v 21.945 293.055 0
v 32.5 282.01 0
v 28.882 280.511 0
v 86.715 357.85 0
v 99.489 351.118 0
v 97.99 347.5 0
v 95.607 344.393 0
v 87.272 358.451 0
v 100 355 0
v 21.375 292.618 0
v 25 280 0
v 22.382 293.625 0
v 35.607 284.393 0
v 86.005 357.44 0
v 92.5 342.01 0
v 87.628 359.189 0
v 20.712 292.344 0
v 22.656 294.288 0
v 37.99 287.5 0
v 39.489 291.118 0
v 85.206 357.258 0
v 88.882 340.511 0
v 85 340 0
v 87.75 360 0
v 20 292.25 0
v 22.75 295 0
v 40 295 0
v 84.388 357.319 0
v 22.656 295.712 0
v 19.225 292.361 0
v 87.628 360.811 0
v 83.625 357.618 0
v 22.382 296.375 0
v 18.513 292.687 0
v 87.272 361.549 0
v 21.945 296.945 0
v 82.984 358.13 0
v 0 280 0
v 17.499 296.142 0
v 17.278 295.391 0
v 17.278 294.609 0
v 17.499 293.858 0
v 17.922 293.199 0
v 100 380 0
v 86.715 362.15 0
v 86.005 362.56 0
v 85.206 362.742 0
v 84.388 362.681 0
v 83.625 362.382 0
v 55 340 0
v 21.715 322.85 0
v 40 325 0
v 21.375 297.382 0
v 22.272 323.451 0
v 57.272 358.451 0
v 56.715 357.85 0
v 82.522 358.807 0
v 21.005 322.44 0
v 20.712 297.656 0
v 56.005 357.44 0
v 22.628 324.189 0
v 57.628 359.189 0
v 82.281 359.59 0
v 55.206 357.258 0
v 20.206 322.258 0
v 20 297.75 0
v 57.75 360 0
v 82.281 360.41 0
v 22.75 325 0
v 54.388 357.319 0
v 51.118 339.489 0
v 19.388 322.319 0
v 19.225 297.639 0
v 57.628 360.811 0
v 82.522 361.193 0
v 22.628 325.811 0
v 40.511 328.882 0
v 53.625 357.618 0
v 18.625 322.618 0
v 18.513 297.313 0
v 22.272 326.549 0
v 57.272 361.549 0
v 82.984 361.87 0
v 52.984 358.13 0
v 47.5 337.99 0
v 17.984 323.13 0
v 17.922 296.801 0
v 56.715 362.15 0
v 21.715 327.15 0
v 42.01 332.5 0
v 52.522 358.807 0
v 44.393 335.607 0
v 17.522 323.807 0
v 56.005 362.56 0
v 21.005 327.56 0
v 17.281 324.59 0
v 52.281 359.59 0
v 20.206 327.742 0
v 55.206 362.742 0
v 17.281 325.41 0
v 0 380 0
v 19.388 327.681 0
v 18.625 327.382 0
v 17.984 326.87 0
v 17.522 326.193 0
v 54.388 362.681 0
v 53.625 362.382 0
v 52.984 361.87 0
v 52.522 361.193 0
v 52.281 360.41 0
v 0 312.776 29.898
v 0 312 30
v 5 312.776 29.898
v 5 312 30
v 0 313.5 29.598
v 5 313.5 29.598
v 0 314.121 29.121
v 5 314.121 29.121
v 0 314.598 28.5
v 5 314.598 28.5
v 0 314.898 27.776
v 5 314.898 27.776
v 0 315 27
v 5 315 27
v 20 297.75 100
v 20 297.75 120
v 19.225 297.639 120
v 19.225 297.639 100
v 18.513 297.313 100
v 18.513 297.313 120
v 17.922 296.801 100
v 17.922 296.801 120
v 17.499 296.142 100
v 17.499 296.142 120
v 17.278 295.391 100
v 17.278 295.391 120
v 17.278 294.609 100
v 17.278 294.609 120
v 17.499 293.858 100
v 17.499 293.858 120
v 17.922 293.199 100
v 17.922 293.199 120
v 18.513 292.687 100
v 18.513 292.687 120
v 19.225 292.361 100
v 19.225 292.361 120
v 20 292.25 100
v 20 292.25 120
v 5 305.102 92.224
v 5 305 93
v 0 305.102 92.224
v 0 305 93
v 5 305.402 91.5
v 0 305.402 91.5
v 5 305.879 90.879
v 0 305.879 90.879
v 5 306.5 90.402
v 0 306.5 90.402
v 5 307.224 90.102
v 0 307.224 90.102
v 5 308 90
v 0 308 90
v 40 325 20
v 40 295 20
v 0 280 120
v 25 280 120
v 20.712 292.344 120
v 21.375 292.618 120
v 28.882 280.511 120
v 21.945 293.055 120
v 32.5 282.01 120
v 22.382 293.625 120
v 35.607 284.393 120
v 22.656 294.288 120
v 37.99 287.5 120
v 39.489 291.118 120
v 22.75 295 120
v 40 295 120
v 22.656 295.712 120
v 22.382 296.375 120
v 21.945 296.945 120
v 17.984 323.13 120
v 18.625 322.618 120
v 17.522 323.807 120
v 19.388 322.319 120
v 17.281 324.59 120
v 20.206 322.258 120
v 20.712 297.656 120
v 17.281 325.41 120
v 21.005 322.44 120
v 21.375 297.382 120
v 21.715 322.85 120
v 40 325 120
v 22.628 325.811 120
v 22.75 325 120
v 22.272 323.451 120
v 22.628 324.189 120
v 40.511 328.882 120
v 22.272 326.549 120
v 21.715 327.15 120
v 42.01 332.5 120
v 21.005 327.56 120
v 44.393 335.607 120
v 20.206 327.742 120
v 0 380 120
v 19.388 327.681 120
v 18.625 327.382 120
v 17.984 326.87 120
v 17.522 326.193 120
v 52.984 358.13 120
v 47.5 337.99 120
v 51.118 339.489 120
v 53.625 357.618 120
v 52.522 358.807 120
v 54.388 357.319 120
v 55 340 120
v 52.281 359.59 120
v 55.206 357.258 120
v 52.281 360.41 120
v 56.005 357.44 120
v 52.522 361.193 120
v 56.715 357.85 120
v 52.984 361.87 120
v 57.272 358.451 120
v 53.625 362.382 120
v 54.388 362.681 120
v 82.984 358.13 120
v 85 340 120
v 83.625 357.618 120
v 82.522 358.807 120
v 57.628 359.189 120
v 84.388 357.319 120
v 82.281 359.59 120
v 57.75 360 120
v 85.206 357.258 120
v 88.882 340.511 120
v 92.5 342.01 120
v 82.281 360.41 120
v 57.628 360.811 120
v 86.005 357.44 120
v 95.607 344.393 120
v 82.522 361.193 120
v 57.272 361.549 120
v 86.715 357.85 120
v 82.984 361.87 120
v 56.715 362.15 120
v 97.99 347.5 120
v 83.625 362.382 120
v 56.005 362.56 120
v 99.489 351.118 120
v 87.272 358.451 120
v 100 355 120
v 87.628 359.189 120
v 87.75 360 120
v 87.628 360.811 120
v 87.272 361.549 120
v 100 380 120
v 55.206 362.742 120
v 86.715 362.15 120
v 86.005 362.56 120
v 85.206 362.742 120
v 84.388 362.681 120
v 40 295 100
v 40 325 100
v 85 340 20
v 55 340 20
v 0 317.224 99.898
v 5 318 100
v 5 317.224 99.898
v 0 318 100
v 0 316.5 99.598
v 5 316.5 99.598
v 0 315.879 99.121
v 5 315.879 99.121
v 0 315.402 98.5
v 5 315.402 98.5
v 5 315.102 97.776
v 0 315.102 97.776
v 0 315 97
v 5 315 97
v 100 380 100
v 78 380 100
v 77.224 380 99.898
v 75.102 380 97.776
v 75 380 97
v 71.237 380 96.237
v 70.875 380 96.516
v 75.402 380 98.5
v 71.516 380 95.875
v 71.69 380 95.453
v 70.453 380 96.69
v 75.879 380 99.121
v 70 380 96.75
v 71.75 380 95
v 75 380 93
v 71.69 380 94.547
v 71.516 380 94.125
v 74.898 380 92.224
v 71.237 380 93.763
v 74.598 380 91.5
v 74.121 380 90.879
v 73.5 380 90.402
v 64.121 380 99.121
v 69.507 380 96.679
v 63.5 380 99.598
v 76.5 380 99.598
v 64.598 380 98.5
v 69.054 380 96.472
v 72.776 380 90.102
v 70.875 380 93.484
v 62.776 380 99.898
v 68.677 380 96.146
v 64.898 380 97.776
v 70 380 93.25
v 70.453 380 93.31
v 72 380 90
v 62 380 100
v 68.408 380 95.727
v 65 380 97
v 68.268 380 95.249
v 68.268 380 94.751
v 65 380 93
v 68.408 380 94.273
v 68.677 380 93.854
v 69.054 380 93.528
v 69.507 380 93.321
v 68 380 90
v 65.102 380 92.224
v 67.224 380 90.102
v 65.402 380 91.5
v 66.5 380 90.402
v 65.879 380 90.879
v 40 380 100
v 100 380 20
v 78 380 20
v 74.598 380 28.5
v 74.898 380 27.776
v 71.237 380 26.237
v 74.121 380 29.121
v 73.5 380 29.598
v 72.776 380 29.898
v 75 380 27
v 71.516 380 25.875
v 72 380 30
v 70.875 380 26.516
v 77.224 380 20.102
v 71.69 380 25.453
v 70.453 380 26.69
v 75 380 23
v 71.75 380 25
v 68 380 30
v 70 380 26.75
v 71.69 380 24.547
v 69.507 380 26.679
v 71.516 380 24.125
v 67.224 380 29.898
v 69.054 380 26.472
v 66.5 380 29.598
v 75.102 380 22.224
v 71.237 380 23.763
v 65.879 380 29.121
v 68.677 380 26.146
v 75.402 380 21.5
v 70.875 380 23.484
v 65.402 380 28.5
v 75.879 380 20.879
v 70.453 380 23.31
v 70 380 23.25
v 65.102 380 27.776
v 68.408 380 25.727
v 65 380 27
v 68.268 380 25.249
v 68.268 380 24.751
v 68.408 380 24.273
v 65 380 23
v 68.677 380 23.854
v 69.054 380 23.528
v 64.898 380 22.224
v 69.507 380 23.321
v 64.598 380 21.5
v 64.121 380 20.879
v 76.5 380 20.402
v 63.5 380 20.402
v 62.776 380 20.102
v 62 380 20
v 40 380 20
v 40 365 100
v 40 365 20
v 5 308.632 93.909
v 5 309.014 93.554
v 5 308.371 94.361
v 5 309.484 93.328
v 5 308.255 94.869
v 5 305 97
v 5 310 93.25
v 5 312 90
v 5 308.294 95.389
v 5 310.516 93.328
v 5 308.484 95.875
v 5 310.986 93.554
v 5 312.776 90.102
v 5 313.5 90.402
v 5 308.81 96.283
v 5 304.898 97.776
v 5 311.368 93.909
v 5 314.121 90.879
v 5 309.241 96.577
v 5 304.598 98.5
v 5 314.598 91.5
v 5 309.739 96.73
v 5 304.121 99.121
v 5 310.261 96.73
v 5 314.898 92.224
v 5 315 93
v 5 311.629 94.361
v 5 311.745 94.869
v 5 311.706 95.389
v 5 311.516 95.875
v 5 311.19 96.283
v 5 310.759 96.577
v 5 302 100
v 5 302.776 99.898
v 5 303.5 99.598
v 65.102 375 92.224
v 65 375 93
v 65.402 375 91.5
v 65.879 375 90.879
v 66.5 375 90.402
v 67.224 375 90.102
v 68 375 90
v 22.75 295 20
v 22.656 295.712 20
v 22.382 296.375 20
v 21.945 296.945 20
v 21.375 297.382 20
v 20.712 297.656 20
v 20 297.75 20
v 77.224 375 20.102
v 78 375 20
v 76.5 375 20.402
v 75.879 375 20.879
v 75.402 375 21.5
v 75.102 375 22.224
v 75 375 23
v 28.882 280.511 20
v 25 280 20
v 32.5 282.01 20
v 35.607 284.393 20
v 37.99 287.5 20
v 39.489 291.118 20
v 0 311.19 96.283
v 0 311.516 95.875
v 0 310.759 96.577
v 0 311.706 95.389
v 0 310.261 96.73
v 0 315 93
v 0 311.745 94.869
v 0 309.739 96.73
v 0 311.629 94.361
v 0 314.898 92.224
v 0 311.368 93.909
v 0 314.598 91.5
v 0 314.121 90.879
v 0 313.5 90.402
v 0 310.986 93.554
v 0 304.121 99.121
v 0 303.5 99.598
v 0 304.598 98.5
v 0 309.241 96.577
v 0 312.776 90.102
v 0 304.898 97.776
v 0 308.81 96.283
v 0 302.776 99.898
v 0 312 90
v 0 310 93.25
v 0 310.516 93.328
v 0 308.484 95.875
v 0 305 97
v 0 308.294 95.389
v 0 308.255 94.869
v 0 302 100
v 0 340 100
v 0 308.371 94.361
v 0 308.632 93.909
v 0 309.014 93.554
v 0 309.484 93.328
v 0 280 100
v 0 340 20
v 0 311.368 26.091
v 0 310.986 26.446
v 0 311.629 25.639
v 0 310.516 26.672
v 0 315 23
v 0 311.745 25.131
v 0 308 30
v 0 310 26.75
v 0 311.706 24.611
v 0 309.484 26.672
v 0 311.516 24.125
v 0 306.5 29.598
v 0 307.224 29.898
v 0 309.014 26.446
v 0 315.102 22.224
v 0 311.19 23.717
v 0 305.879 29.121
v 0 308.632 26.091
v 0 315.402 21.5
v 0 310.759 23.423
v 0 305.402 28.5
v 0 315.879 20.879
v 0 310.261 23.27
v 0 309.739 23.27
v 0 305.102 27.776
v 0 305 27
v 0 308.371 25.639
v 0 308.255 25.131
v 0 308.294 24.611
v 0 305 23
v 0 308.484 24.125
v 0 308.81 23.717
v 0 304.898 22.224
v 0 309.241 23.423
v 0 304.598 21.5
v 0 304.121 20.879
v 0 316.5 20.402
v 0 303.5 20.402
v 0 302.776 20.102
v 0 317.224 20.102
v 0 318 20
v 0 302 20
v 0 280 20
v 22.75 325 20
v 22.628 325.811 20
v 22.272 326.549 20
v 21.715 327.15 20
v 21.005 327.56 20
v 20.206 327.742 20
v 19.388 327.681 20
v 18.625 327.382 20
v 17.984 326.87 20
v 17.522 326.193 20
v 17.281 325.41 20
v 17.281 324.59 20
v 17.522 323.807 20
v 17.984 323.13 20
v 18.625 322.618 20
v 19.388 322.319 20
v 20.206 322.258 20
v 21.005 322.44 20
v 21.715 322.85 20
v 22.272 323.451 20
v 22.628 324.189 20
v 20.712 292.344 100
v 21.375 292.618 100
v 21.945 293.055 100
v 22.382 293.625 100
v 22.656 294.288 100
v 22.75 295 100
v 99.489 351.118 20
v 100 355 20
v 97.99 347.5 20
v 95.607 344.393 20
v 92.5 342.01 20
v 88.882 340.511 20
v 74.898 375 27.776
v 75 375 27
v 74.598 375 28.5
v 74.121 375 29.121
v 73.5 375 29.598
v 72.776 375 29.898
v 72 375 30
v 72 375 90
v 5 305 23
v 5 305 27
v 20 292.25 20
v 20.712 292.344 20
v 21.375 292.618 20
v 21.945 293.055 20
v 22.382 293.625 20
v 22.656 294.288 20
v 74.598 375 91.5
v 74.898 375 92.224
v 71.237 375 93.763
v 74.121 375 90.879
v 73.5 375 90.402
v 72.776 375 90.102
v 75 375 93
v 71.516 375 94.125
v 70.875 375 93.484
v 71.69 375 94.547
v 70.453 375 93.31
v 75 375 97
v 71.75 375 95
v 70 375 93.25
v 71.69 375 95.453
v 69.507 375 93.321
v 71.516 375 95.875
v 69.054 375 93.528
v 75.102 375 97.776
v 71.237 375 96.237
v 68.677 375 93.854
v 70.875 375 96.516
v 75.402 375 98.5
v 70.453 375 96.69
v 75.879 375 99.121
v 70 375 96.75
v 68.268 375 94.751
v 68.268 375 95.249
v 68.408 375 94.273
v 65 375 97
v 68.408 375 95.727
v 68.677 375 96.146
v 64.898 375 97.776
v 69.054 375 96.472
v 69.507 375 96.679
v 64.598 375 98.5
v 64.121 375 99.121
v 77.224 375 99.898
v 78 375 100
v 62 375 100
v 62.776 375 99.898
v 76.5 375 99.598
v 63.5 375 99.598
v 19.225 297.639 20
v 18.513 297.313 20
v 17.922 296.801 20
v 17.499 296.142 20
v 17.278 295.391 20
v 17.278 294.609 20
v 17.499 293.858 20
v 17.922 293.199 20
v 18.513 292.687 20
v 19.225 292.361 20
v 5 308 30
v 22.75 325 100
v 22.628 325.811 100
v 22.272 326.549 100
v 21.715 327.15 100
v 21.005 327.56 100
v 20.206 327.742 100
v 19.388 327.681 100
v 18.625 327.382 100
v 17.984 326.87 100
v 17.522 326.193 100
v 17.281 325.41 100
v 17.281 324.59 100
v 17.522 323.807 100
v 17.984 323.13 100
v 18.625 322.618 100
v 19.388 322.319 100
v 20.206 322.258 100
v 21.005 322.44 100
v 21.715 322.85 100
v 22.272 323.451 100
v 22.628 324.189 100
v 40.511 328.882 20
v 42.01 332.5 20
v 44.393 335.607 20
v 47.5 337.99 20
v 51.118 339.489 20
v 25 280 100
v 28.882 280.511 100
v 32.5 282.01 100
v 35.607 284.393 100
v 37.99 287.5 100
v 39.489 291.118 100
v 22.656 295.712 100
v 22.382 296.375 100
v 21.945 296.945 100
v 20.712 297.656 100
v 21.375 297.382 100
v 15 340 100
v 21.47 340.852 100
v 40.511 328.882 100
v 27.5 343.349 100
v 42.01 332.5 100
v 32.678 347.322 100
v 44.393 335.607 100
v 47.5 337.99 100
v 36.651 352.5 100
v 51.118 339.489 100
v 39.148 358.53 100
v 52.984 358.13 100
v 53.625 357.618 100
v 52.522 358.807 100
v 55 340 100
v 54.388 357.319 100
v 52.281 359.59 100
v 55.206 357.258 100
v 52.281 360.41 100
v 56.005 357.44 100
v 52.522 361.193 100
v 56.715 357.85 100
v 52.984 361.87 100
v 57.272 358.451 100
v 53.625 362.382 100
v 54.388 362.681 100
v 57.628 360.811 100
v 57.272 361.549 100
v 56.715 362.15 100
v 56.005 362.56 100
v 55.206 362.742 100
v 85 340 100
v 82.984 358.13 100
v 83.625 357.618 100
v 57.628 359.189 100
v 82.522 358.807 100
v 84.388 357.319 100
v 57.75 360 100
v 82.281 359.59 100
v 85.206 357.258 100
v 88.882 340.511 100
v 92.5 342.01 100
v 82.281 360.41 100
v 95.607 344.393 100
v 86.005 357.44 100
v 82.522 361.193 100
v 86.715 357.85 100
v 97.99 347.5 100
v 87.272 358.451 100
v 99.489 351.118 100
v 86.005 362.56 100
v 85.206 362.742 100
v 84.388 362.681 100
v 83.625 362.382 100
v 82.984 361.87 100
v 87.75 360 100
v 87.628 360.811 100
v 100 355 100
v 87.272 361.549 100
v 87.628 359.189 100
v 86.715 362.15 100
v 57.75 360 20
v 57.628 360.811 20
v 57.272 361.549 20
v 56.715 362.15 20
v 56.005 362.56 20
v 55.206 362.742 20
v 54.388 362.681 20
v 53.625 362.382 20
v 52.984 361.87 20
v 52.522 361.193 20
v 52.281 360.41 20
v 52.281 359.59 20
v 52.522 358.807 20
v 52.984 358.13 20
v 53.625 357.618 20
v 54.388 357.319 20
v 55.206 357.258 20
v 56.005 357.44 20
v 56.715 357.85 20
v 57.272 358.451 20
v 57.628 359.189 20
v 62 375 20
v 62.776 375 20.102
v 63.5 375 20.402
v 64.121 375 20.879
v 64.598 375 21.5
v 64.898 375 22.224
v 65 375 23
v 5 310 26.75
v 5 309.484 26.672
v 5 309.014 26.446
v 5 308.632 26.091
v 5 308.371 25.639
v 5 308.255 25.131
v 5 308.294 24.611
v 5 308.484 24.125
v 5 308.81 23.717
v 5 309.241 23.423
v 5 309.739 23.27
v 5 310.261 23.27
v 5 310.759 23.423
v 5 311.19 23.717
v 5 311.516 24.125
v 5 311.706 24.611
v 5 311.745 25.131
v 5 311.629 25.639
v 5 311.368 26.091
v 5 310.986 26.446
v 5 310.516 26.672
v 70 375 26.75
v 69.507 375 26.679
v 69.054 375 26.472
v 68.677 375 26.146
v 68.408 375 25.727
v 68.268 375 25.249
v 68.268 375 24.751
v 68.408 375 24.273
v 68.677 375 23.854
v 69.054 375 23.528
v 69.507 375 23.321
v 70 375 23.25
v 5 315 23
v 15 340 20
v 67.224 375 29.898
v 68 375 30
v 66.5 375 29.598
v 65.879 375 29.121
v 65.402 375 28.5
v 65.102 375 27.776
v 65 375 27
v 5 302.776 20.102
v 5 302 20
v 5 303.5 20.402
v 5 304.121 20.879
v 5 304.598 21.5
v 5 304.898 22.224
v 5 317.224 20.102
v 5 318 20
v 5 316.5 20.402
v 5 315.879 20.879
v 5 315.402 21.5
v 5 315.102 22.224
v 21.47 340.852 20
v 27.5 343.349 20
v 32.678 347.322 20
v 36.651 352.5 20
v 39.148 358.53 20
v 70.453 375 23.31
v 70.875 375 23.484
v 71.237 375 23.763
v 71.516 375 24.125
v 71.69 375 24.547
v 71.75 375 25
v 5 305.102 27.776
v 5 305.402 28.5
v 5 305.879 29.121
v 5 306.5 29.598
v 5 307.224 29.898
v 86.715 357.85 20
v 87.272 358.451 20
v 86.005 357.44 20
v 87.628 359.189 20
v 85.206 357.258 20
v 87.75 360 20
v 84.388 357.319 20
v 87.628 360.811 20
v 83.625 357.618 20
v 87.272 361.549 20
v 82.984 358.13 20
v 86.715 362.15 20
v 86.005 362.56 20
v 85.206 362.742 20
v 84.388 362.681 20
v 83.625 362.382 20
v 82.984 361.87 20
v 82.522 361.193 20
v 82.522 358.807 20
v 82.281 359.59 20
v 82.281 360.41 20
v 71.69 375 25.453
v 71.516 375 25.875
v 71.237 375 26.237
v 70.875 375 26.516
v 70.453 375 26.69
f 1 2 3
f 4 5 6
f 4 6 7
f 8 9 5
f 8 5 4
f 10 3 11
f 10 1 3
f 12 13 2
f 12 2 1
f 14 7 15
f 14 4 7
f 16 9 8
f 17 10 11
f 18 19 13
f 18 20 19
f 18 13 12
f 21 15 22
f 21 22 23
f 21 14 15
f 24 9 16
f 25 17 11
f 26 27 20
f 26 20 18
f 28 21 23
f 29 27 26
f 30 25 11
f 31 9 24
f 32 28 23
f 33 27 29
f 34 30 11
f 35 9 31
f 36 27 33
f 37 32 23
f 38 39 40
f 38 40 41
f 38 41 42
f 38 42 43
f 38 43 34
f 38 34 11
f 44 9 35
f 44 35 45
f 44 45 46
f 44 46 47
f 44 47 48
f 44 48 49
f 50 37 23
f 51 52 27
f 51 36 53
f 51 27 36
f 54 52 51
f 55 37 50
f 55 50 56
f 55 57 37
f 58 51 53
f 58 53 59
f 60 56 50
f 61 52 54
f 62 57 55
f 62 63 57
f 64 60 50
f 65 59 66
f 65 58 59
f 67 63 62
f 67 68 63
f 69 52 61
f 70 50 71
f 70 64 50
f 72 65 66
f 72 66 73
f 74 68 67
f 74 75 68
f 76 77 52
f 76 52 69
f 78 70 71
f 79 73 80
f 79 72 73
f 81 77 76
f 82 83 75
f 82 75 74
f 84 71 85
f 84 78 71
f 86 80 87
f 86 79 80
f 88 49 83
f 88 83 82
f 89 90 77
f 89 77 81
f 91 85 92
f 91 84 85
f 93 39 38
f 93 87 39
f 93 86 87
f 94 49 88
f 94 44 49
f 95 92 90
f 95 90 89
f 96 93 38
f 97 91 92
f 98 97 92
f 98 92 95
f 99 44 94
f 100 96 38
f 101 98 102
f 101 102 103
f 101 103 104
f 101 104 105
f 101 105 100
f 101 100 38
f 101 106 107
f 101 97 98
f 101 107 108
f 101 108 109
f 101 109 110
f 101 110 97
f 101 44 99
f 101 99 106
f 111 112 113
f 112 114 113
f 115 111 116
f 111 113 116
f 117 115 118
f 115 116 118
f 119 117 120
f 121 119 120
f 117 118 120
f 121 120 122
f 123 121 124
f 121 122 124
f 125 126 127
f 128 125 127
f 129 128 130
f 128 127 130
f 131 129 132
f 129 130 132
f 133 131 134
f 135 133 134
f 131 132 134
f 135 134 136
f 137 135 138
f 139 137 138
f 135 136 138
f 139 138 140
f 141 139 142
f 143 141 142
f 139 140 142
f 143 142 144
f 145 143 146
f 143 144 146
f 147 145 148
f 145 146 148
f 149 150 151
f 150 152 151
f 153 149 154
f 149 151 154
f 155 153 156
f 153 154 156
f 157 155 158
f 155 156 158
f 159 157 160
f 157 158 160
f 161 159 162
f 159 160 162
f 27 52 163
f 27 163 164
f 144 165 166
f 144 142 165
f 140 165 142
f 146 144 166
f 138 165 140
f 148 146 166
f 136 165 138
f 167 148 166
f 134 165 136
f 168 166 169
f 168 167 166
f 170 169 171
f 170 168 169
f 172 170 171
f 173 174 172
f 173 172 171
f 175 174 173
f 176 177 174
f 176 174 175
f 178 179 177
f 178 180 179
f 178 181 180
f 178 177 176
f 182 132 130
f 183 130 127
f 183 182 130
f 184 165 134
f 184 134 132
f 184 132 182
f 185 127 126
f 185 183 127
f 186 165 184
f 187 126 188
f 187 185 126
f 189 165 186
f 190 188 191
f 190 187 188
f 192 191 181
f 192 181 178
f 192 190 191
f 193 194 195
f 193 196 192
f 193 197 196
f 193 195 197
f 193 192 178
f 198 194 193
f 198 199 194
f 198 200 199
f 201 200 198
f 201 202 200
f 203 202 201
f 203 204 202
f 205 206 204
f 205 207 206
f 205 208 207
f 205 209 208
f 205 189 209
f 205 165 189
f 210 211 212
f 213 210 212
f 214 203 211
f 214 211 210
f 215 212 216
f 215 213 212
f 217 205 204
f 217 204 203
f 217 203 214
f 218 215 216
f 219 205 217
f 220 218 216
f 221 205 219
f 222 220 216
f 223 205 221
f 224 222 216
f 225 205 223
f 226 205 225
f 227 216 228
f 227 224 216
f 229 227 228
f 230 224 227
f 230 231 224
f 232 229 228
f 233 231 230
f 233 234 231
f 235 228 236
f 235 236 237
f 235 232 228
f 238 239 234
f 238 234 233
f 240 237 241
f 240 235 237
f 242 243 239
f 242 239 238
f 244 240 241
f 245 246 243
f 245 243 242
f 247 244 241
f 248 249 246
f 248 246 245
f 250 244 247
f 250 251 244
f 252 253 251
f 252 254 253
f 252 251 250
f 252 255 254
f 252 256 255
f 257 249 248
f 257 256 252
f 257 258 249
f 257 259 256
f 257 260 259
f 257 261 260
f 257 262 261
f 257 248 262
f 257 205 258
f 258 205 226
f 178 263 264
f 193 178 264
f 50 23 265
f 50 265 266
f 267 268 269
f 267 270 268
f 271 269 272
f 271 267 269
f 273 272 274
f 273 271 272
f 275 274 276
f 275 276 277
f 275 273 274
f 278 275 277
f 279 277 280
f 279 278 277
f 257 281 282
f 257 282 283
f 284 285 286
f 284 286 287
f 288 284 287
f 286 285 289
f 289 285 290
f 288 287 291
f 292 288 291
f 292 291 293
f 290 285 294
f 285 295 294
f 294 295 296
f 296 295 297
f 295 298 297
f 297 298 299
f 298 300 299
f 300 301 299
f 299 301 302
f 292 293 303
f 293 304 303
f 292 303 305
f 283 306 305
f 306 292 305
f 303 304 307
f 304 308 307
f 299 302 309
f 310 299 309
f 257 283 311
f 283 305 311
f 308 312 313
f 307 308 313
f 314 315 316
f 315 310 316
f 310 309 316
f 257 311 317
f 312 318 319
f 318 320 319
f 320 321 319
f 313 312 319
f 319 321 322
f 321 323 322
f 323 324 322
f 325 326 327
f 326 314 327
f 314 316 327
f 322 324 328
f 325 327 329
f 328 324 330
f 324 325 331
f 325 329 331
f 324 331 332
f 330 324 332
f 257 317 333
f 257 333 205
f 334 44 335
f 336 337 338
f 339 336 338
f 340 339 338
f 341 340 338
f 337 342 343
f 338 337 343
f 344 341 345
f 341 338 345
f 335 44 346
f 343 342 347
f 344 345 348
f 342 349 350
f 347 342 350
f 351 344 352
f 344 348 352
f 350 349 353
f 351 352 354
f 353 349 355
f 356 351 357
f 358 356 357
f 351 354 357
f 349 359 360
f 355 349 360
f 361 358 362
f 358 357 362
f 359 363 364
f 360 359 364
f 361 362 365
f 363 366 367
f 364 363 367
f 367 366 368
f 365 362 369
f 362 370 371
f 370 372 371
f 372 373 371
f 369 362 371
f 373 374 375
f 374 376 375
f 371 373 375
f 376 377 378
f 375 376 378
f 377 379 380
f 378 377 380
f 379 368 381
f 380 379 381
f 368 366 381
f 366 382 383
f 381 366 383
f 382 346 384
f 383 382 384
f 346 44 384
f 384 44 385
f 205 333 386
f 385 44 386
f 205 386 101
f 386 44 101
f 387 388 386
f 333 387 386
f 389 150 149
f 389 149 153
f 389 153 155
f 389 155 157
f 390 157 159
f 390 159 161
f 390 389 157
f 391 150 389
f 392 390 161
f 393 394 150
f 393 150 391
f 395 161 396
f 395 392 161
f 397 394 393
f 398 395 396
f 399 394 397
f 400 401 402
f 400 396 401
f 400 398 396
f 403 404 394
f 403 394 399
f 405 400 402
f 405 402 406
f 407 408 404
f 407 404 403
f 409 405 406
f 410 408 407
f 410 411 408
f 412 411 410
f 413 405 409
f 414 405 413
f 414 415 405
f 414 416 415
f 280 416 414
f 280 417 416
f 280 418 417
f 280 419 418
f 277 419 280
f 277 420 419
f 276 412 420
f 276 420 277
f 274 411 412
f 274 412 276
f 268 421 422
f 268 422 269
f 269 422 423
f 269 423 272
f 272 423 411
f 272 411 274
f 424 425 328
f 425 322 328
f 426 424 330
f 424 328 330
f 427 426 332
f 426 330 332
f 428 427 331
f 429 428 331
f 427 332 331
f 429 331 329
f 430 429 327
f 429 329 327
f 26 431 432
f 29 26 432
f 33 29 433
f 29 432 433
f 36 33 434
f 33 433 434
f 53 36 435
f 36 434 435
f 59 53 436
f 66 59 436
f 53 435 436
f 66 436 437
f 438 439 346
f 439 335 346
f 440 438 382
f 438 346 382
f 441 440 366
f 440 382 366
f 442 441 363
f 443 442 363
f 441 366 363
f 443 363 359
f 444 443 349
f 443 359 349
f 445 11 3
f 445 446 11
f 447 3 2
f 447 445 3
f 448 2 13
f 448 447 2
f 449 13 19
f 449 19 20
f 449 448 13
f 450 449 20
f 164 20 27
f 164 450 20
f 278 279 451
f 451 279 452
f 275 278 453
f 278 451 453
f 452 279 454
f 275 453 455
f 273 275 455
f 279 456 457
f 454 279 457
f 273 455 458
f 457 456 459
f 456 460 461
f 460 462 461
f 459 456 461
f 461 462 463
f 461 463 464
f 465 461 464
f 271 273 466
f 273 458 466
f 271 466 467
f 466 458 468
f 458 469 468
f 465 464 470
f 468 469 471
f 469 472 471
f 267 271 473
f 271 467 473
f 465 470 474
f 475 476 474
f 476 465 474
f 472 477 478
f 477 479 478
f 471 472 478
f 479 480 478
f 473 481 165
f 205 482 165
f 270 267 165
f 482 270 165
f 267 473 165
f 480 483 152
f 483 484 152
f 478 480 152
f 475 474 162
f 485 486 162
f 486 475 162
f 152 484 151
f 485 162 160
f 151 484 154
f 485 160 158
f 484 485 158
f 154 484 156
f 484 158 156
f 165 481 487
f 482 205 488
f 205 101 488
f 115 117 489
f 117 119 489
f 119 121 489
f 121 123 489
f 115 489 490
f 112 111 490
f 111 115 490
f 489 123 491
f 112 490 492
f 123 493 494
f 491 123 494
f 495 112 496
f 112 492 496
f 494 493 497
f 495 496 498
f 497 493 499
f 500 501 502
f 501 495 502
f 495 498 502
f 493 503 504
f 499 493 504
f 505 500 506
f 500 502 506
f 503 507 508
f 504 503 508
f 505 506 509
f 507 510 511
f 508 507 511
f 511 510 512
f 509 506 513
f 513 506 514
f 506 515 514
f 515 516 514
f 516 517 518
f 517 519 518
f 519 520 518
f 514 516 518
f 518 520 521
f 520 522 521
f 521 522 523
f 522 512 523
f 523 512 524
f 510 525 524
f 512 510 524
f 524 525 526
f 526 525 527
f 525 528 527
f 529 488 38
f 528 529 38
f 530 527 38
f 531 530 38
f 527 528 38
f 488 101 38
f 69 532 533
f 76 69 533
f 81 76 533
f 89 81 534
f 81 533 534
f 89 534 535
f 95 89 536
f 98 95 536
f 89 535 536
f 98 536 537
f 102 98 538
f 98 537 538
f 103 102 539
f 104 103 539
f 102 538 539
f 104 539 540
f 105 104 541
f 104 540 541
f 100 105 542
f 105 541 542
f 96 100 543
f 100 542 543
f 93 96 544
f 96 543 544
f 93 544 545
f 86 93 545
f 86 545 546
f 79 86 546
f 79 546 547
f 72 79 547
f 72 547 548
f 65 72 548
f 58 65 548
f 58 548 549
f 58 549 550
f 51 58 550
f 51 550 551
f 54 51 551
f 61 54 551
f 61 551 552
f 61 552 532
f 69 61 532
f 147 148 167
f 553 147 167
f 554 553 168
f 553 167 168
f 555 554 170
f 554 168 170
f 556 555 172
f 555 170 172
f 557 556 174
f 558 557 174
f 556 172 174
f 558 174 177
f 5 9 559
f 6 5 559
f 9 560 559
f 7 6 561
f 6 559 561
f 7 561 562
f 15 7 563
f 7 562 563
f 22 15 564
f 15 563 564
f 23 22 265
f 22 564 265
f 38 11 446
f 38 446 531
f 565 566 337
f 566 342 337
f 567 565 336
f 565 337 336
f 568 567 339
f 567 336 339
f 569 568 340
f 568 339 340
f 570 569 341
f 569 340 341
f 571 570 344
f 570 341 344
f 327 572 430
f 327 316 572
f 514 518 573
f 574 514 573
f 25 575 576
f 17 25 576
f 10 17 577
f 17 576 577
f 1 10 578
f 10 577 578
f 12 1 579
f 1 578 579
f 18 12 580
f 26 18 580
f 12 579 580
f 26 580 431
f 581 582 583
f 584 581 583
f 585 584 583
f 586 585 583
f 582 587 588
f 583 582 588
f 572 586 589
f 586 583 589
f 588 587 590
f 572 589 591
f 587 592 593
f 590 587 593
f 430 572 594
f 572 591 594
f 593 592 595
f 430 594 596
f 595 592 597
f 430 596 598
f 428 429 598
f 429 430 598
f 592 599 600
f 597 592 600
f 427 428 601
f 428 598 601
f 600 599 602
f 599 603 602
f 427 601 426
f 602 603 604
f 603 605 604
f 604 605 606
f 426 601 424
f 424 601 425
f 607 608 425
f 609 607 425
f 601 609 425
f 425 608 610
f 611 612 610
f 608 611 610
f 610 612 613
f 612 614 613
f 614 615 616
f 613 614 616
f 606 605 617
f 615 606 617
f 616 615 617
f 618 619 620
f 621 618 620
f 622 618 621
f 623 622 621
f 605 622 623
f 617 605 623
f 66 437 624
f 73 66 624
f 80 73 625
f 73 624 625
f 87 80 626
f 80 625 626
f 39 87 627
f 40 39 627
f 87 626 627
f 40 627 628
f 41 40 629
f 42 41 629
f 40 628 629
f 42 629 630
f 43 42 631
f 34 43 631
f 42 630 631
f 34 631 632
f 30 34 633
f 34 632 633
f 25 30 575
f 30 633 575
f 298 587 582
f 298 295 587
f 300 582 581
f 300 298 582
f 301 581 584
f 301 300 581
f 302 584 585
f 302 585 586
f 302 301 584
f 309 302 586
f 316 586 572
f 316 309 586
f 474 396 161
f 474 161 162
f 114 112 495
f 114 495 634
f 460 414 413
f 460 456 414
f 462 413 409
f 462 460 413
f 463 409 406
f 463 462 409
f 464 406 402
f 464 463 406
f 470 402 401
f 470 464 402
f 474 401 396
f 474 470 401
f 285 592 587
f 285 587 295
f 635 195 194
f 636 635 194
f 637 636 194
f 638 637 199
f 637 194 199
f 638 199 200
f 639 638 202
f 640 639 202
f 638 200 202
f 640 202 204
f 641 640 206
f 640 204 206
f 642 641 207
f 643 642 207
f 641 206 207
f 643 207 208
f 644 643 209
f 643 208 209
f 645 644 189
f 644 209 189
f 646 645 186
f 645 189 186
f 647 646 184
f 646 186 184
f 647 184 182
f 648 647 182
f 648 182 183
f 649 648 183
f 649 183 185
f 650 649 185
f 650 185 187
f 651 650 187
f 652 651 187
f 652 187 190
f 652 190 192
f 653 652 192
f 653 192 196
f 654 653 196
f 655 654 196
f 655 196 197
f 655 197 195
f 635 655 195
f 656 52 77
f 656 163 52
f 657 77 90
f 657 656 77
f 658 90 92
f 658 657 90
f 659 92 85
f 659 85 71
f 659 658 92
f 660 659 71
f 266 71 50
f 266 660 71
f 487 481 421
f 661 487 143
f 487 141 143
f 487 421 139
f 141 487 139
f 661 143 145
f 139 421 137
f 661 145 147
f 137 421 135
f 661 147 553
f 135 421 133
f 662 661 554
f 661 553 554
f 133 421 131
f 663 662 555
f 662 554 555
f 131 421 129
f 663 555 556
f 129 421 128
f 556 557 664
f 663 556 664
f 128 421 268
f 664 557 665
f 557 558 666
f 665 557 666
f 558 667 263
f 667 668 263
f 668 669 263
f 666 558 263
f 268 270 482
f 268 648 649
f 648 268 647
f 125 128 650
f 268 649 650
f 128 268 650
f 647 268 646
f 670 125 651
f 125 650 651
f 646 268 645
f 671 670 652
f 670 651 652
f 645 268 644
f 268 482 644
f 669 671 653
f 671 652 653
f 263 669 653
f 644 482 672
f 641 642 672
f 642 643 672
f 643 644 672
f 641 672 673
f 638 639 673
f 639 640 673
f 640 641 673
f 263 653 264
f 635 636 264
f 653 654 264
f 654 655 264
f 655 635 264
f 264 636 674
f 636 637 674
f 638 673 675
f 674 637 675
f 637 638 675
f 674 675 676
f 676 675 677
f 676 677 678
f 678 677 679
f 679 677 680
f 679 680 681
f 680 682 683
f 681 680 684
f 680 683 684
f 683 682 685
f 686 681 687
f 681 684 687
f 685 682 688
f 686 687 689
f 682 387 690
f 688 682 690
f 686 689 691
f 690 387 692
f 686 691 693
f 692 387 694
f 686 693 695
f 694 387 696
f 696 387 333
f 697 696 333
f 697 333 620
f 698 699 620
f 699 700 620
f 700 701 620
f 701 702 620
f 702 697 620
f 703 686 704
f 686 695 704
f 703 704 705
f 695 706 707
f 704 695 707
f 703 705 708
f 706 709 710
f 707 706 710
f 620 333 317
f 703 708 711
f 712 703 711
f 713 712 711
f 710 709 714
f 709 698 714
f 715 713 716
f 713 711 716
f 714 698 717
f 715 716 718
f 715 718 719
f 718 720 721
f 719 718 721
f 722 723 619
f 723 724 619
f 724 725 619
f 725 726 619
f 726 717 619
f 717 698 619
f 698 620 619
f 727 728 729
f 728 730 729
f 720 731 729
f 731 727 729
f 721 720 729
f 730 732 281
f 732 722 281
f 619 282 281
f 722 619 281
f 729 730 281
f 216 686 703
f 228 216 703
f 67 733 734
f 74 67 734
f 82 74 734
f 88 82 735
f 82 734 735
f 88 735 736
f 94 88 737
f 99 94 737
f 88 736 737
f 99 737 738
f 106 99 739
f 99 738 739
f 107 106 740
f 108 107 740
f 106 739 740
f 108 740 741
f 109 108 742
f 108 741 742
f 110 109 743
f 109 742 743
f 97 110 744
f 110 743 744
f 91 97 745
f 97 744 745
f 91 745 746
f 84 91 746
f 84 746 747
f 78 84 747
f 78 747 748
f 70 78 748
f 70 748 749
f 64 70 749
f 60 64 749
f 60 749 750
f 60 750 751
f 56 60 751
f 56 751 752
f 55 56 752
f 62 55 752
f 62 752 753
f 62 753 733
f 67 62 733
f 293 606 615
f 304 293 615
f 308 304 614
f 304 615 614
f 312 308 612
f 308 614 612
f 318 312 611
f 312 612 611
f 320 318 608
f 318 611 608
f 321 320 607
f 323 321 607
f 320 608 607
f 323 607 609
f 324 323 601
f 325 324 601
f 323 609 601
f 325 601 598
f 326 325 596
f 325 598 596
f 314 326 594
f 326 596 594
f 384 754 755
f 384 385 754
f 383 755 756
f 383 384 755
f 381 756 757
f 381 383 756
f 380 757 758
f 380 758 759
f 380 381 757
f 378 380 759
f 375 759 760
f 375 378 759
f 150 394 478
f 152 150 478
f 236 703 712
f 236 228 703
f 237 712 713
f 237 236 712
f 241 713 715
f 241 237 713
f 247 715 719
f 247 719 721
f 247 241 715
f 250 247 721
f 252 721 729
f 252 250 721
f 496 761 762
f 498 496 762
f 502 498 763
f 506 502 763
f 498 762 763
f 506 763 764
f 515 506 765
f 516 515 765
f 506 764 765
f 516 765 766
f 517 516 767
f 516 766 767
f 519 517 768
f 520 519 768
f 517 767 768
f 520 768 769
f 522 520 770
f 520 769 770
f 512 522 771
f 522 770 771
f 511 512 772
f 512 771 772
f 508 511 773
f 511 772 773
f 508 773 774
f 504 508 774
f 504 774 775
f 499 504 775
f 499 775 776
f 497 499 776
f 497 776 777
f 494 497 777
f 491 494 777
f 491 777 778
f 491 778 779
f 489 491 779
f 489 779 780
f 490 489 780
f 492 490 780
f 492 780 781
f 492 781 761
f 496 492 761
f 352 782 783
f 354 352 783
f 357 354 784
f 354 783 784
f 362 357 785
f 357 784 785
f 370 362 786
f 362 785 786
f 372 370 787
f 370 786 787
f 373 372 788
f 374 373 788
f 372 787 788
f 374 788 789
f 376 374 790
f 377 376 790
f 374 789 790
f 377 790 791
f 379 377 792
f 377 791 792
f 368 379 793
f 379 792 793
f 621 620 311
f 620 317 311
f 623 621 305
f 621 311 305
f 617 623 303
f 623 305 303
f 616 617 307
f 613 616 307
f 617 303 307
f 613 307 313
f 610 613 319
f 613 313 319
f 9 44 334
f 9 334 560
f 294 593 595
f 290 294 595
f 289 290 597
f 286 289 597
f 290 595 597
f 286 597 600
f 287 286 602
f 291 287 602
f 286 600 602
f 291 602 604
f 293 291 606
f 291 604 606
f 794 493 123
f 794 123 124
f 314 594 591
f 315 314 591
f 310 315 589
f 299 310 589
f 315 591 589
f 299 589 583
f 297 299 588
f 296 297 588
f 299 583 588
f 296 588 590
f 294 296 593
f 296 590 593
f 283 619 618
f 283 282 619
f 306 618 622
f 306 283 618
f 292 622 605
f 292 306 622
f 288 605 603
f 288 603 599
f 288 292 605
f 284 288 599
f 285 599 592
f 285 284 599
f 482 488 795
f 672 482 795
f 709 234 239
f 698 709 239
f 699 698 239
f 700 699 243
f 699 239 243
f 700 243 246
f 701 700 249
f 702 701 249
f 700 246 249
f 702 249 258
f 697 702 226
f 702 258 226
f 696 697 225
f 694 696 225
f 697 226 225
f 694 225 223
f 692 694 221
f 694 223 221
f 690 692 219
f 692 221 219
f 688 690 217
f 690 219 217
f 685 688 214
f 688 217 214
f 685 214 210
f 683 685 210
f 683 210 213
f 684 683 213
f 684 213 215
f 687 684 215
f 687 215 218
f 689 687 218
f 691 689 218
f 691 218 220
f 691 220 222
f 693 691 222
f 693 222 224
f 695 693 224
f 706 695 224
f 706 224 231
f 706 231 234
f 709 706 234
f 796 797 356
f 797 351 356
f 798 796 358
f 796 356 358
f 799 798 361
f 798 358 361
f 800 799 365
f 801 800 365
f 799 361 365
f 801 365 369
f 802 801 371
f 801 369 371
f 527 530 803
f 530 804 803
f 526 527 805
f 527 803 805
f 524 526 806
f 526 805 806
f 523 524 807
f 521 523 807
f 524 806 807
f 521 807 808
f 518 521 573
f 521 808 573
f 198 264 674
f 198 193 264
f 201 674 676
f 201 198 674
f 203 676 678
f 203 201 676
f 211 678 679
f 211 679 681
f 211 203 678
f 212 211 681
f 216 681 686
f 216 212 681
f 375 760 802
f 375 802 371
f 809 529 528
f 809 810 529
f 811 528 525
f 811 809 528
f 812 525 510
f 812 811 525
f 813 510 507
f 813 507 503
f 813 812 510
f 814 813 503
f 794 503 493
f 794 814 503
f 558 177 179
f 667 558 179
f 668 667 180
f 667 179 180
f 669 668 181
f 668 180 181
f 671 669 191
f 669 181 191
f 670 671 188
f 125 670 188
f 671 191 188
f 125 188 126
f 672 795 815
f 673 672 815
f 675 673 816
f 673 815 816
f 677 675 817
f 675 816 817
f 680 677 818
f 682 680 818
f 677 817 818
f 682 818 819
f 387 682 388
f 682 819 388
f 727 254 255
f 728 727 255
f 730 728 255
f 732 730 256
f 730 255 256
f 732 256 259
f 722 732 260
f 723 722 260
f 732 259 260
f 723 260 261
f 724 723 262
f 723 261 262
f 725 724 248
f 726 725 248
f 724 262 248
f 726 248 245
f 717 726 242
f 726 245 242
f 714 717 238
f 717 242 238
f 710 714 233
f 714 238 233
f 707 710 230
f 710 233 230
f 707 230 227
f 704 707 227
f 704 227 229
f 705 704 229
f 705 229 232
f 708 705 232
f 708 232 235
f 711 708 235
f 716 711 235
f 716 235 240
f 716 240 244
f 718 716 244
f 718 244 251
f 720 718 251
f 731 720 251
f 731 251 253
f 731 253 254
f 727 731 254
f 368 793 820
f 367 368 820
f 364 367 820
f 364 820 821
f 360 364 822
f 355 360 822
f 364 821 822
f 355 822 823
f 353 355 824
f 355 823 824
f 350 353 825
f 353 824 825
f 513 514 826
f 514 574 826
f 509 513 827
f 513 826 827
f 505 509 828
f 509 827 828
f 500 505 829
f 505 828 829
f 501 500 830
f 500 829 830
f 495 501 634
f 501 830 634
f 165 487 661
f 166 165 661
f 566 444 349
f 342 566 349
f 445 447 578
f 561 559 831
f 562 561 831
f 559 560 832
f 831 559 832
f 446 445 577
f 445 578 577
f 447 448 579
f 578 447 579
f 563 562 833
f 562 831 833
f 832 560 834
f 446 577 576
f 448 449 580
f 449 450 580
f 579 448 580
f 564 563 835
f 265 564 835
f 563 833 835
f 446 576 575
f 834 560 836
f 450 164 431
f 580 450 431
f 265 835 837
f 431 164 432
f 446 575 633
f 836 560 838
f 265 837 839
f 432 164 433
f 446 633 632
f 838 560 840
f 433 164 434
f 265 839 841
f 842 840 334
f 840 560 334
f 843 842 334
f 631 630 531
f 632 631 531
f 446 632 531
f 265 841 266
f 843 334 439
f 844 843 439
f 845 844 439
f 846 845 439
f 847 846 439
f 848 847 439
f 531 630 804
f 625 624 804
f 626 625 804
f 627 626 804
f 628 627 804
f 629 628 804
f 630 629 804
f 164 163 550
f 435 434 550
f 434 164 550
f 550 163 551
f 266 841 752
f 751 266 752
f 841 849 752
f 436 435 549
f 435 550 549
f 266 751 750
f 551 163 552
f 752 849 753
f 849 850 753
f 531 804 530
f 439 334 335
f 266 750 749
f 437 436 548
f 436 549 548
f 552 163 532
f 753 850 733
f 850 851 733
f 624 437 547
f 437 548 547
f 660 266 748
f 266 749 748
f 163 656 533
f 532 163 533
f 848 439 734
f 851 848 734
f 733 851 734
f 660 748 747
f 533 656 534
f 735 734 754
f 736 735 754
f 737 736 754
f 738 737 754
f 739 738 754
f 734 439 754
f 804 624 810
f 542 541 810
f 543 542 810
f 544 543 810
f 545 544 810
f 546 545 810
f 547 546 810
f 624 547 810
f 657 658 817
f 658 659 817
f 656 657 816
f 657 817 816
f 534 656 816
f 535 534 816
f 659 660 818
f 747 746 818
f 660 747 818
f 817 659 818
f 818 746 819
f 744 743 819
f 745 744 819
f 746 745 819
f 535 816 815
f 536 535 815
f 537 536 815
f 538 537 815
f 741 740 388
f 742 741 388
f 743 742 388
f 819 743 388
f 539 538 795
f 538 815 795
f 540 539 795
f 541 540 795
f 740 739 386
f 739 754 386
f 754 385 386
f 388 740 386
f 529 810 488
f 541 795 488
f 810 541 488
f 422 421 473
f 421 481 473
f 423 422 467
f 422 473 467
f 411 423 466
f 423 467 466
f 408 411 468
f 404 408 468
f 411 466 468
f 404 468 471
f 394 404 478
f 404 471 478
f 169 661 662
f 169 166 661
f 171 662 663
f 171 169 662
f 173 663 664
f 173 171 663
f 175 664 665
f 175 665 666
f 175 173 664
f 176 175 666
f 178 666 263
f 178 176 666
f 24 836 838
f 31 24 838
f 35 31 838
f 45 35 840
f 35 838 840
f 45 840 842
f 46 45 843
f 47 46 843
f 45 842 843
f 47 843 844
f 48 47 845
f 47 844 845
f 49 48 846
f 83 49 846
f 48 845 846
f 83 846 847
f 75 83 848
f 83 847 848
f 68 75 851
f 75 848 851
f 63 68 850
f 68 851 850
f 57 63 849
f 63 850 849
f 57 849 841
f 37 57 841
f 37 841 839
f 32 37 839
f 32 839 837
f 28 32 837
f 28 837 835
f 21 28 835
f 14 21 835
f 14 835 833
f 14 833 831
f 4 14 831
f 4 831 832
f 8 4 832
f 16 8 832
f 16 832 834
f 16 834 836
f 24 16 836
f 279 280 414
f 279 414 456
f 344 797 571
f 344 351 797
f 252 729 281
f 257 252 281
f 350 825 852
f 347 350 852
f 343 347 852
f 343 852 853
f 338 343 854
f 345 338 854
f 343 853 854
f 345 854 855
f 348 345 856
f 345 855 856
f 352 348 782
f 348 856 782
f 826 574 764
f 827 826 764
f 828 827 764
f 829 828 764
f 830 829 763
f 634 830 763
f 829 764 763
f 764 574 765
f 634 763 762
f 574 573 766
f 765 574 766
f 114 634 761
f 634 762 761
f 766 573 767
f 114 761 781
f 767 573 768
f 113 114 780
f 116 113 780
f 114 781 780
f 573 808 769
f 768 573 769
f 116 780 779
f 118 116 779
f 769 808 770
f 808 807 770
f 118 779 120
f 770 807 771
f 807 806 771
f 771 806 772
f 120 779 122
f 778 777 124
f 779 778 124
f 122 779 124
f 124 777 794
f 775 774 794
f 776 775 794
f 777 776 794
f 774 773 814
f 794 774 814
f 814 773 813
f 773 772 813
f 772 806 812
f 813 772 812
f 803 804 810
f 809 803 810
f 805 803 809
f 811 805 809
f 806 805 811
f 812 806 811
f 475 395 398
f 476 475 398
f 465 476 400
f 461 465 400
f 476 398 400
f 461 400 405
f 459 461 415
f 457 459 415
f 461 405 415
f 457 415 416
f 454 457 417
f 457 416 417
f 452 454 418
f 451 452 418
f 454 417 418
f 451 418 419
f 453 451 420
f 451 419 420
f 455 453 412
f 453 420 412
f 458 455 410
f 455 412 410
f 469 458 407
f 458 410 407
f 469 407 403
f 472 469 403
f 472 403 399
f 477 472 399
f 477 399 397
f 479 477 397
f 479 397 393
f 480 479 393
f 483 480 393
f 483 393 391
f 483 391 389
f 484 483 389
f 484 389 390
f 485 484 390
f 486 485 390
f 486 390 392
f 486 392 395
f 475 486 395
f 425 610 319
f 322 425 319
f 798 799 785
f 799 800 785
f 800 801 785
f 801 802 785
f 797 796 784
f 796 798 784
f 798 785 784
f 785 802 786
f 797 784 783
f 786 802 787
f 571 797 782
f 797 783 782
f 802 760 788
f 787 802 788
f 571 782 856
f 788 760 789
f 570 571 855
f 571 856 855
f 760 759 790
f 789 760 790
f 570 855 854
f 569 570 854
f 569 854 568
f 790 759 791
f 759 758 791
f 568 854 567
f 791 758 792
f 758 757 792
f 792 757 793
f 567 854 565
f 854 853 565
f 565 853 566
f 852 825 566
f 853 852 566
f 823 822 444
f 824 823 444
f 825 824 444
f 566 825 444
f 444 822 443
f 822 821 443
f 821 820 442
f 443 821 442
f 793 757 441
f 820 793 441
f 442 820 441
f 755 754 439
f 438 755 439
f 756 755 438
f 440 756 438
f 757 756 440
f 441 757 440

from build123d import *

# Parameters (mm, degrees)
BOSS_EXTRUDE1_DEPTH = 20
SKETCH2_W           = 40
SKETCH2_H           = 40
BOSS_EXTRUDE2_DEPTH = 80
SKETCH3_W           = 40
SKETCH3_H           = 60
SKETCH3_H_2         = 40
SKETCH3_W_2         = 60
BOSS_EXTRUDE3_DEPTH = 20
SKETCH5_R           = 2.75
CUT_EXTRUDE1_DEPTH  = 167
FILLET1_R           = 25
FILLET2_R           = 15
SKETCH6_W           = 5
SKETCH6_H           = 10
SKETCH6_W_2         = 10
SKETCH6_H_2         = 5
BOSS_EXTRUDE4_DEPTH = 10
CUT_EXTRUDE2_DEPTH  = 10
CUT_EXTRUDE3_DEPTH  = 10
SKETCH9_W           = 10
SKETCH9_H           = 5
SKETCH9_W_2         = 5
SKETCH9_H_2         = 10
BOSS_EXTRUDE5_DEPTH = 10
CUT_EXTRUDE4_DEPTH  = 10
CUT_EXTRUDE5_DEPTH  = 10
FILLET4_R           = 3


with BuildPart() as part:
    # Sketch1 → Boss-Extrude1 (new body)
    with BuildSketch(Plane.XY):
        Polygon((100, 380), (100, 340), (40, 340), (40, 280), (0, 280), (0, 380), align=None)
    extrude(amount=BOSS_EXTRUDE1_DEPTH)

    # Sketch2 → Boss-Extrude2 (add)
    with BuildSketch(Plane.XY.offset(20)):
        with Locations((20, 360)):
            Rectangle(SKETCH2_W, SKETCH2_H)
    extrude(amount=BOSS_EXTRUDE2_DEPTH)

    # Sketch3 → Boss-Extrude3 (add)
    with BuildSketch(Plane.XY.offset(100)):
        with Locations((20, 310)):
            Rectangle(SKETCH3_W, SKETCH3_H)
        with Locations((20, 360)):
            Rectangle(SKETCH3_W, SKETCH3_H_2)
        with Locations((70, 360)):
            Rectangle(SKETCH3_W_2, SKETCH3_H_2)
    extrude(amount=BOSS_EXTRUDE3_DEPTH)

    # Sketch5 → Cut-Extrude1 (cut)
    with BuildSketch(Plane.XY.offset(120)):
        with Locations((55, 360)):
            Circle(SKETCH5_R)
        with BuildLine():
            ThreePointArc((82.25, 360), (85, 357.25), (87.75, 360))
            Line((87.75, 360), (82.25, 360))
        make_face()
        with BuildLine():
            Line((82.25, 360), (87.75, 360))
            ThreePointArc((87.75, 360), (85, 362.75), (82.25, 360))
        make_face()
        with Locations((20, 325)):
            Circle(SKETCH5_R)
        with BuildLine():
            ThreePointArc((22.75, 295), (21.944543648, 296.944543648), (20, 297.75))
            Line((20, 297.75), (20, 292.25))
            ThreePointArc((20, 292.25), (21.944543648, 293.055456352), (22.75, 295))
        make_face()
        with BuildLine():
            Line((20, 292.25), (20, 297.75))
            ThreePointArc((20, 297.75), (17.25, 295), (20, 292.25))
        make_face()
    extrude(amount=-CUT_EXTRUDE1_DEPTH, mode=Mode.SUBTRACT)

    # Fillet1
    # the kernel refuses this fillet: 25 mm, written as the material it takes off along each edge
    with BuildSketch(Plane(origin=(40, 340, 20), x_dir=(0, 1, 0), z_dir=(0, 0, 1))) as fillet1_piece_1:
        with BuildLine():
            CenterArc((FILLET1_R, FILLET1_R), FILLET1_R, 180, 90)
            Line((0, FILLET1_R), (0, 0))
            Line((0, 0), (FILLET1_R, 0))
        make_face()
    extrude(amount=80, mode=Mode.SUBTRACT)

    # Fillet2
    fillet2_edges = [part.edges().sort_by_distance(p)[0] for p in [
        (100, 340, 10),
        (40, 340, 10),
        (40, 280, 10),
        (40, 280, 110),
        (40, 340, 110),
        (100, 340, 110),
    ]]
    fillet(fillet2_edges, radius=FILLET2_R)

    # Sketch6 → Boss-Extrude4 (add)
    with BuildSketch(Plane.XY.offset(20)):
        with Locations((2.5, 310)):
            Rectangle(SKETCH6_W, SKETCH6_H)
        with Locations((70, 377.5)):
            Rectangle(SKETCH6_W_2, SKETCH6_H_2)
    extrude(amount=BOSS_EXTRUDE4_DEPTH)

    # Sketch7 → Cut-Extrude2 (cut)
    with BuildSketch(Plane.XZ.offset(-375)):
        with BuildLine():
            ThreePointArc((71.75, 25), (71.237436867, 26.237436867), (70, 26.75))
            Line((70, 26.75), (70, 23.25))
            ThreePointArc((70, 23.25), (71.237436867, 23.762563133), (71.75, 25))
        make_face()
        with BuildLine():
            Line((70, 23.25), (70, 26.75))
            ThreePointArc((70, 26.75), (68.25, 25), (70, 23.25))
        make_face()
    extrude(amount=-CUT_EXTRUDE2_DEPTH, mode=Mode.SUBTRACT)

    # Sketch8 → Cut-Extrude3 (cut)
    with BuildSketch(Plane(origin=(5, 0, 0), x_dir=(0, 0, -1), z_dir=(1, 0, 0))):
        with BuildLine():
            ThreePointArc((-23.25, 310), (-25, 311.75), (-26.75, 310))
            Line((-26.75, 310), (-23.25, 310))
        make_face()
        with BuildLine():
            Line((-23.25, 310), (-26.75, 310))
            ThreePointArc((-26.75, 310), (-25, 308.25), (-23.25, 310))
        make_face()
    extrude(amount=-CUT_EXTRUDE3_DEPTH, mode=Mode.SUBTRACT)

    # Sketch9 → Boss-Extrude5 (add)
    with BuildSketch(Plane(origin=(0, 0, 100), x_dir=(-1, 0, 0), z_dir=(0, 0, -1))):
        with Locations((-70, 377.5)):
            Rectangle(SKETCH9_W, SKETCH9_H)
        with Locations((-2.5, 310)):
            Rectangle(SKETCH9_W_2, SKETCH9_H_2)
    extrude(amount=BOSS_EXTRUDE5_DEPTH)

    # Sketch10 → Cut-Extrude4 (cut)
    with BuildSketch(Plane(origin=(5, 0, 0), x_dir=(0, 0, -1), z_dir=(1, 0, 0))):
        with BuildLine():
            ThreePointArc((-96.75, 310), (-95, 308.25), (-93.25, 310))
            Line((-93.25, 310), (-96.75, 310))
        make_face()
        with BuildLine():
            Line((-96.75, 310), (-93.25, 310))
            ThreePointArc((-93.25, 310), (-95, 311.75), (-96.75, 310))
        make_face()
    extrude(amount=-CUT_EXTRUDE4_DEPTH, mode=Mode.SUBTRACT)

    # Sketch11 → Cut-Extrude5 (cut)
    with BuildSketch(Plane.XZ.offset(-375)):
        with BuildLine():
            ThreePointArc((71.75, 95), (71.237436867, 96.237436867), (70, 96.75))
            Line((70, 96.75), (70, 93.25))
            ThreePointArc((70, 93.25), (71.237436867, 93.762563133), (71.75, 95))
        make_face()
        with BuildLine():
            Line((70, 93.25), (70, 96.75))
            ThreePointArc((70, 96.75), (68.25, 95), (70, 93.25))
        make_face()
    extrude(amount=-CUT_EXTRUDE5_DEPTH, mode=Mode.SUBTRACT)

    # Fillet4
    fillet4_edges = [part.edges().sort_by_distance(p)[0] for p in [
        (2.5, 315, 30),
        (2.5, 305, 20),
        (2.5, 305, 30),
        (2.5, 315, 20),
        (75, 377.5, 30),
        (65, 377.5, 20),
        (65, 377.5, 30),
        (75, 377.5, 20),
        (65, 377.5, 100),
        (75, 377.5, 100),
        (65, 377.5, 90),
        (75, 377.5, 90),
        (2.5, 305, 100),
        (2.5, 315, 100),
        (2.5, 305, 90),
        (2.5, 315, 90),
    ]]
    fillet(fillet4_edges, radius=FILLET4_R)


solid = part.part
